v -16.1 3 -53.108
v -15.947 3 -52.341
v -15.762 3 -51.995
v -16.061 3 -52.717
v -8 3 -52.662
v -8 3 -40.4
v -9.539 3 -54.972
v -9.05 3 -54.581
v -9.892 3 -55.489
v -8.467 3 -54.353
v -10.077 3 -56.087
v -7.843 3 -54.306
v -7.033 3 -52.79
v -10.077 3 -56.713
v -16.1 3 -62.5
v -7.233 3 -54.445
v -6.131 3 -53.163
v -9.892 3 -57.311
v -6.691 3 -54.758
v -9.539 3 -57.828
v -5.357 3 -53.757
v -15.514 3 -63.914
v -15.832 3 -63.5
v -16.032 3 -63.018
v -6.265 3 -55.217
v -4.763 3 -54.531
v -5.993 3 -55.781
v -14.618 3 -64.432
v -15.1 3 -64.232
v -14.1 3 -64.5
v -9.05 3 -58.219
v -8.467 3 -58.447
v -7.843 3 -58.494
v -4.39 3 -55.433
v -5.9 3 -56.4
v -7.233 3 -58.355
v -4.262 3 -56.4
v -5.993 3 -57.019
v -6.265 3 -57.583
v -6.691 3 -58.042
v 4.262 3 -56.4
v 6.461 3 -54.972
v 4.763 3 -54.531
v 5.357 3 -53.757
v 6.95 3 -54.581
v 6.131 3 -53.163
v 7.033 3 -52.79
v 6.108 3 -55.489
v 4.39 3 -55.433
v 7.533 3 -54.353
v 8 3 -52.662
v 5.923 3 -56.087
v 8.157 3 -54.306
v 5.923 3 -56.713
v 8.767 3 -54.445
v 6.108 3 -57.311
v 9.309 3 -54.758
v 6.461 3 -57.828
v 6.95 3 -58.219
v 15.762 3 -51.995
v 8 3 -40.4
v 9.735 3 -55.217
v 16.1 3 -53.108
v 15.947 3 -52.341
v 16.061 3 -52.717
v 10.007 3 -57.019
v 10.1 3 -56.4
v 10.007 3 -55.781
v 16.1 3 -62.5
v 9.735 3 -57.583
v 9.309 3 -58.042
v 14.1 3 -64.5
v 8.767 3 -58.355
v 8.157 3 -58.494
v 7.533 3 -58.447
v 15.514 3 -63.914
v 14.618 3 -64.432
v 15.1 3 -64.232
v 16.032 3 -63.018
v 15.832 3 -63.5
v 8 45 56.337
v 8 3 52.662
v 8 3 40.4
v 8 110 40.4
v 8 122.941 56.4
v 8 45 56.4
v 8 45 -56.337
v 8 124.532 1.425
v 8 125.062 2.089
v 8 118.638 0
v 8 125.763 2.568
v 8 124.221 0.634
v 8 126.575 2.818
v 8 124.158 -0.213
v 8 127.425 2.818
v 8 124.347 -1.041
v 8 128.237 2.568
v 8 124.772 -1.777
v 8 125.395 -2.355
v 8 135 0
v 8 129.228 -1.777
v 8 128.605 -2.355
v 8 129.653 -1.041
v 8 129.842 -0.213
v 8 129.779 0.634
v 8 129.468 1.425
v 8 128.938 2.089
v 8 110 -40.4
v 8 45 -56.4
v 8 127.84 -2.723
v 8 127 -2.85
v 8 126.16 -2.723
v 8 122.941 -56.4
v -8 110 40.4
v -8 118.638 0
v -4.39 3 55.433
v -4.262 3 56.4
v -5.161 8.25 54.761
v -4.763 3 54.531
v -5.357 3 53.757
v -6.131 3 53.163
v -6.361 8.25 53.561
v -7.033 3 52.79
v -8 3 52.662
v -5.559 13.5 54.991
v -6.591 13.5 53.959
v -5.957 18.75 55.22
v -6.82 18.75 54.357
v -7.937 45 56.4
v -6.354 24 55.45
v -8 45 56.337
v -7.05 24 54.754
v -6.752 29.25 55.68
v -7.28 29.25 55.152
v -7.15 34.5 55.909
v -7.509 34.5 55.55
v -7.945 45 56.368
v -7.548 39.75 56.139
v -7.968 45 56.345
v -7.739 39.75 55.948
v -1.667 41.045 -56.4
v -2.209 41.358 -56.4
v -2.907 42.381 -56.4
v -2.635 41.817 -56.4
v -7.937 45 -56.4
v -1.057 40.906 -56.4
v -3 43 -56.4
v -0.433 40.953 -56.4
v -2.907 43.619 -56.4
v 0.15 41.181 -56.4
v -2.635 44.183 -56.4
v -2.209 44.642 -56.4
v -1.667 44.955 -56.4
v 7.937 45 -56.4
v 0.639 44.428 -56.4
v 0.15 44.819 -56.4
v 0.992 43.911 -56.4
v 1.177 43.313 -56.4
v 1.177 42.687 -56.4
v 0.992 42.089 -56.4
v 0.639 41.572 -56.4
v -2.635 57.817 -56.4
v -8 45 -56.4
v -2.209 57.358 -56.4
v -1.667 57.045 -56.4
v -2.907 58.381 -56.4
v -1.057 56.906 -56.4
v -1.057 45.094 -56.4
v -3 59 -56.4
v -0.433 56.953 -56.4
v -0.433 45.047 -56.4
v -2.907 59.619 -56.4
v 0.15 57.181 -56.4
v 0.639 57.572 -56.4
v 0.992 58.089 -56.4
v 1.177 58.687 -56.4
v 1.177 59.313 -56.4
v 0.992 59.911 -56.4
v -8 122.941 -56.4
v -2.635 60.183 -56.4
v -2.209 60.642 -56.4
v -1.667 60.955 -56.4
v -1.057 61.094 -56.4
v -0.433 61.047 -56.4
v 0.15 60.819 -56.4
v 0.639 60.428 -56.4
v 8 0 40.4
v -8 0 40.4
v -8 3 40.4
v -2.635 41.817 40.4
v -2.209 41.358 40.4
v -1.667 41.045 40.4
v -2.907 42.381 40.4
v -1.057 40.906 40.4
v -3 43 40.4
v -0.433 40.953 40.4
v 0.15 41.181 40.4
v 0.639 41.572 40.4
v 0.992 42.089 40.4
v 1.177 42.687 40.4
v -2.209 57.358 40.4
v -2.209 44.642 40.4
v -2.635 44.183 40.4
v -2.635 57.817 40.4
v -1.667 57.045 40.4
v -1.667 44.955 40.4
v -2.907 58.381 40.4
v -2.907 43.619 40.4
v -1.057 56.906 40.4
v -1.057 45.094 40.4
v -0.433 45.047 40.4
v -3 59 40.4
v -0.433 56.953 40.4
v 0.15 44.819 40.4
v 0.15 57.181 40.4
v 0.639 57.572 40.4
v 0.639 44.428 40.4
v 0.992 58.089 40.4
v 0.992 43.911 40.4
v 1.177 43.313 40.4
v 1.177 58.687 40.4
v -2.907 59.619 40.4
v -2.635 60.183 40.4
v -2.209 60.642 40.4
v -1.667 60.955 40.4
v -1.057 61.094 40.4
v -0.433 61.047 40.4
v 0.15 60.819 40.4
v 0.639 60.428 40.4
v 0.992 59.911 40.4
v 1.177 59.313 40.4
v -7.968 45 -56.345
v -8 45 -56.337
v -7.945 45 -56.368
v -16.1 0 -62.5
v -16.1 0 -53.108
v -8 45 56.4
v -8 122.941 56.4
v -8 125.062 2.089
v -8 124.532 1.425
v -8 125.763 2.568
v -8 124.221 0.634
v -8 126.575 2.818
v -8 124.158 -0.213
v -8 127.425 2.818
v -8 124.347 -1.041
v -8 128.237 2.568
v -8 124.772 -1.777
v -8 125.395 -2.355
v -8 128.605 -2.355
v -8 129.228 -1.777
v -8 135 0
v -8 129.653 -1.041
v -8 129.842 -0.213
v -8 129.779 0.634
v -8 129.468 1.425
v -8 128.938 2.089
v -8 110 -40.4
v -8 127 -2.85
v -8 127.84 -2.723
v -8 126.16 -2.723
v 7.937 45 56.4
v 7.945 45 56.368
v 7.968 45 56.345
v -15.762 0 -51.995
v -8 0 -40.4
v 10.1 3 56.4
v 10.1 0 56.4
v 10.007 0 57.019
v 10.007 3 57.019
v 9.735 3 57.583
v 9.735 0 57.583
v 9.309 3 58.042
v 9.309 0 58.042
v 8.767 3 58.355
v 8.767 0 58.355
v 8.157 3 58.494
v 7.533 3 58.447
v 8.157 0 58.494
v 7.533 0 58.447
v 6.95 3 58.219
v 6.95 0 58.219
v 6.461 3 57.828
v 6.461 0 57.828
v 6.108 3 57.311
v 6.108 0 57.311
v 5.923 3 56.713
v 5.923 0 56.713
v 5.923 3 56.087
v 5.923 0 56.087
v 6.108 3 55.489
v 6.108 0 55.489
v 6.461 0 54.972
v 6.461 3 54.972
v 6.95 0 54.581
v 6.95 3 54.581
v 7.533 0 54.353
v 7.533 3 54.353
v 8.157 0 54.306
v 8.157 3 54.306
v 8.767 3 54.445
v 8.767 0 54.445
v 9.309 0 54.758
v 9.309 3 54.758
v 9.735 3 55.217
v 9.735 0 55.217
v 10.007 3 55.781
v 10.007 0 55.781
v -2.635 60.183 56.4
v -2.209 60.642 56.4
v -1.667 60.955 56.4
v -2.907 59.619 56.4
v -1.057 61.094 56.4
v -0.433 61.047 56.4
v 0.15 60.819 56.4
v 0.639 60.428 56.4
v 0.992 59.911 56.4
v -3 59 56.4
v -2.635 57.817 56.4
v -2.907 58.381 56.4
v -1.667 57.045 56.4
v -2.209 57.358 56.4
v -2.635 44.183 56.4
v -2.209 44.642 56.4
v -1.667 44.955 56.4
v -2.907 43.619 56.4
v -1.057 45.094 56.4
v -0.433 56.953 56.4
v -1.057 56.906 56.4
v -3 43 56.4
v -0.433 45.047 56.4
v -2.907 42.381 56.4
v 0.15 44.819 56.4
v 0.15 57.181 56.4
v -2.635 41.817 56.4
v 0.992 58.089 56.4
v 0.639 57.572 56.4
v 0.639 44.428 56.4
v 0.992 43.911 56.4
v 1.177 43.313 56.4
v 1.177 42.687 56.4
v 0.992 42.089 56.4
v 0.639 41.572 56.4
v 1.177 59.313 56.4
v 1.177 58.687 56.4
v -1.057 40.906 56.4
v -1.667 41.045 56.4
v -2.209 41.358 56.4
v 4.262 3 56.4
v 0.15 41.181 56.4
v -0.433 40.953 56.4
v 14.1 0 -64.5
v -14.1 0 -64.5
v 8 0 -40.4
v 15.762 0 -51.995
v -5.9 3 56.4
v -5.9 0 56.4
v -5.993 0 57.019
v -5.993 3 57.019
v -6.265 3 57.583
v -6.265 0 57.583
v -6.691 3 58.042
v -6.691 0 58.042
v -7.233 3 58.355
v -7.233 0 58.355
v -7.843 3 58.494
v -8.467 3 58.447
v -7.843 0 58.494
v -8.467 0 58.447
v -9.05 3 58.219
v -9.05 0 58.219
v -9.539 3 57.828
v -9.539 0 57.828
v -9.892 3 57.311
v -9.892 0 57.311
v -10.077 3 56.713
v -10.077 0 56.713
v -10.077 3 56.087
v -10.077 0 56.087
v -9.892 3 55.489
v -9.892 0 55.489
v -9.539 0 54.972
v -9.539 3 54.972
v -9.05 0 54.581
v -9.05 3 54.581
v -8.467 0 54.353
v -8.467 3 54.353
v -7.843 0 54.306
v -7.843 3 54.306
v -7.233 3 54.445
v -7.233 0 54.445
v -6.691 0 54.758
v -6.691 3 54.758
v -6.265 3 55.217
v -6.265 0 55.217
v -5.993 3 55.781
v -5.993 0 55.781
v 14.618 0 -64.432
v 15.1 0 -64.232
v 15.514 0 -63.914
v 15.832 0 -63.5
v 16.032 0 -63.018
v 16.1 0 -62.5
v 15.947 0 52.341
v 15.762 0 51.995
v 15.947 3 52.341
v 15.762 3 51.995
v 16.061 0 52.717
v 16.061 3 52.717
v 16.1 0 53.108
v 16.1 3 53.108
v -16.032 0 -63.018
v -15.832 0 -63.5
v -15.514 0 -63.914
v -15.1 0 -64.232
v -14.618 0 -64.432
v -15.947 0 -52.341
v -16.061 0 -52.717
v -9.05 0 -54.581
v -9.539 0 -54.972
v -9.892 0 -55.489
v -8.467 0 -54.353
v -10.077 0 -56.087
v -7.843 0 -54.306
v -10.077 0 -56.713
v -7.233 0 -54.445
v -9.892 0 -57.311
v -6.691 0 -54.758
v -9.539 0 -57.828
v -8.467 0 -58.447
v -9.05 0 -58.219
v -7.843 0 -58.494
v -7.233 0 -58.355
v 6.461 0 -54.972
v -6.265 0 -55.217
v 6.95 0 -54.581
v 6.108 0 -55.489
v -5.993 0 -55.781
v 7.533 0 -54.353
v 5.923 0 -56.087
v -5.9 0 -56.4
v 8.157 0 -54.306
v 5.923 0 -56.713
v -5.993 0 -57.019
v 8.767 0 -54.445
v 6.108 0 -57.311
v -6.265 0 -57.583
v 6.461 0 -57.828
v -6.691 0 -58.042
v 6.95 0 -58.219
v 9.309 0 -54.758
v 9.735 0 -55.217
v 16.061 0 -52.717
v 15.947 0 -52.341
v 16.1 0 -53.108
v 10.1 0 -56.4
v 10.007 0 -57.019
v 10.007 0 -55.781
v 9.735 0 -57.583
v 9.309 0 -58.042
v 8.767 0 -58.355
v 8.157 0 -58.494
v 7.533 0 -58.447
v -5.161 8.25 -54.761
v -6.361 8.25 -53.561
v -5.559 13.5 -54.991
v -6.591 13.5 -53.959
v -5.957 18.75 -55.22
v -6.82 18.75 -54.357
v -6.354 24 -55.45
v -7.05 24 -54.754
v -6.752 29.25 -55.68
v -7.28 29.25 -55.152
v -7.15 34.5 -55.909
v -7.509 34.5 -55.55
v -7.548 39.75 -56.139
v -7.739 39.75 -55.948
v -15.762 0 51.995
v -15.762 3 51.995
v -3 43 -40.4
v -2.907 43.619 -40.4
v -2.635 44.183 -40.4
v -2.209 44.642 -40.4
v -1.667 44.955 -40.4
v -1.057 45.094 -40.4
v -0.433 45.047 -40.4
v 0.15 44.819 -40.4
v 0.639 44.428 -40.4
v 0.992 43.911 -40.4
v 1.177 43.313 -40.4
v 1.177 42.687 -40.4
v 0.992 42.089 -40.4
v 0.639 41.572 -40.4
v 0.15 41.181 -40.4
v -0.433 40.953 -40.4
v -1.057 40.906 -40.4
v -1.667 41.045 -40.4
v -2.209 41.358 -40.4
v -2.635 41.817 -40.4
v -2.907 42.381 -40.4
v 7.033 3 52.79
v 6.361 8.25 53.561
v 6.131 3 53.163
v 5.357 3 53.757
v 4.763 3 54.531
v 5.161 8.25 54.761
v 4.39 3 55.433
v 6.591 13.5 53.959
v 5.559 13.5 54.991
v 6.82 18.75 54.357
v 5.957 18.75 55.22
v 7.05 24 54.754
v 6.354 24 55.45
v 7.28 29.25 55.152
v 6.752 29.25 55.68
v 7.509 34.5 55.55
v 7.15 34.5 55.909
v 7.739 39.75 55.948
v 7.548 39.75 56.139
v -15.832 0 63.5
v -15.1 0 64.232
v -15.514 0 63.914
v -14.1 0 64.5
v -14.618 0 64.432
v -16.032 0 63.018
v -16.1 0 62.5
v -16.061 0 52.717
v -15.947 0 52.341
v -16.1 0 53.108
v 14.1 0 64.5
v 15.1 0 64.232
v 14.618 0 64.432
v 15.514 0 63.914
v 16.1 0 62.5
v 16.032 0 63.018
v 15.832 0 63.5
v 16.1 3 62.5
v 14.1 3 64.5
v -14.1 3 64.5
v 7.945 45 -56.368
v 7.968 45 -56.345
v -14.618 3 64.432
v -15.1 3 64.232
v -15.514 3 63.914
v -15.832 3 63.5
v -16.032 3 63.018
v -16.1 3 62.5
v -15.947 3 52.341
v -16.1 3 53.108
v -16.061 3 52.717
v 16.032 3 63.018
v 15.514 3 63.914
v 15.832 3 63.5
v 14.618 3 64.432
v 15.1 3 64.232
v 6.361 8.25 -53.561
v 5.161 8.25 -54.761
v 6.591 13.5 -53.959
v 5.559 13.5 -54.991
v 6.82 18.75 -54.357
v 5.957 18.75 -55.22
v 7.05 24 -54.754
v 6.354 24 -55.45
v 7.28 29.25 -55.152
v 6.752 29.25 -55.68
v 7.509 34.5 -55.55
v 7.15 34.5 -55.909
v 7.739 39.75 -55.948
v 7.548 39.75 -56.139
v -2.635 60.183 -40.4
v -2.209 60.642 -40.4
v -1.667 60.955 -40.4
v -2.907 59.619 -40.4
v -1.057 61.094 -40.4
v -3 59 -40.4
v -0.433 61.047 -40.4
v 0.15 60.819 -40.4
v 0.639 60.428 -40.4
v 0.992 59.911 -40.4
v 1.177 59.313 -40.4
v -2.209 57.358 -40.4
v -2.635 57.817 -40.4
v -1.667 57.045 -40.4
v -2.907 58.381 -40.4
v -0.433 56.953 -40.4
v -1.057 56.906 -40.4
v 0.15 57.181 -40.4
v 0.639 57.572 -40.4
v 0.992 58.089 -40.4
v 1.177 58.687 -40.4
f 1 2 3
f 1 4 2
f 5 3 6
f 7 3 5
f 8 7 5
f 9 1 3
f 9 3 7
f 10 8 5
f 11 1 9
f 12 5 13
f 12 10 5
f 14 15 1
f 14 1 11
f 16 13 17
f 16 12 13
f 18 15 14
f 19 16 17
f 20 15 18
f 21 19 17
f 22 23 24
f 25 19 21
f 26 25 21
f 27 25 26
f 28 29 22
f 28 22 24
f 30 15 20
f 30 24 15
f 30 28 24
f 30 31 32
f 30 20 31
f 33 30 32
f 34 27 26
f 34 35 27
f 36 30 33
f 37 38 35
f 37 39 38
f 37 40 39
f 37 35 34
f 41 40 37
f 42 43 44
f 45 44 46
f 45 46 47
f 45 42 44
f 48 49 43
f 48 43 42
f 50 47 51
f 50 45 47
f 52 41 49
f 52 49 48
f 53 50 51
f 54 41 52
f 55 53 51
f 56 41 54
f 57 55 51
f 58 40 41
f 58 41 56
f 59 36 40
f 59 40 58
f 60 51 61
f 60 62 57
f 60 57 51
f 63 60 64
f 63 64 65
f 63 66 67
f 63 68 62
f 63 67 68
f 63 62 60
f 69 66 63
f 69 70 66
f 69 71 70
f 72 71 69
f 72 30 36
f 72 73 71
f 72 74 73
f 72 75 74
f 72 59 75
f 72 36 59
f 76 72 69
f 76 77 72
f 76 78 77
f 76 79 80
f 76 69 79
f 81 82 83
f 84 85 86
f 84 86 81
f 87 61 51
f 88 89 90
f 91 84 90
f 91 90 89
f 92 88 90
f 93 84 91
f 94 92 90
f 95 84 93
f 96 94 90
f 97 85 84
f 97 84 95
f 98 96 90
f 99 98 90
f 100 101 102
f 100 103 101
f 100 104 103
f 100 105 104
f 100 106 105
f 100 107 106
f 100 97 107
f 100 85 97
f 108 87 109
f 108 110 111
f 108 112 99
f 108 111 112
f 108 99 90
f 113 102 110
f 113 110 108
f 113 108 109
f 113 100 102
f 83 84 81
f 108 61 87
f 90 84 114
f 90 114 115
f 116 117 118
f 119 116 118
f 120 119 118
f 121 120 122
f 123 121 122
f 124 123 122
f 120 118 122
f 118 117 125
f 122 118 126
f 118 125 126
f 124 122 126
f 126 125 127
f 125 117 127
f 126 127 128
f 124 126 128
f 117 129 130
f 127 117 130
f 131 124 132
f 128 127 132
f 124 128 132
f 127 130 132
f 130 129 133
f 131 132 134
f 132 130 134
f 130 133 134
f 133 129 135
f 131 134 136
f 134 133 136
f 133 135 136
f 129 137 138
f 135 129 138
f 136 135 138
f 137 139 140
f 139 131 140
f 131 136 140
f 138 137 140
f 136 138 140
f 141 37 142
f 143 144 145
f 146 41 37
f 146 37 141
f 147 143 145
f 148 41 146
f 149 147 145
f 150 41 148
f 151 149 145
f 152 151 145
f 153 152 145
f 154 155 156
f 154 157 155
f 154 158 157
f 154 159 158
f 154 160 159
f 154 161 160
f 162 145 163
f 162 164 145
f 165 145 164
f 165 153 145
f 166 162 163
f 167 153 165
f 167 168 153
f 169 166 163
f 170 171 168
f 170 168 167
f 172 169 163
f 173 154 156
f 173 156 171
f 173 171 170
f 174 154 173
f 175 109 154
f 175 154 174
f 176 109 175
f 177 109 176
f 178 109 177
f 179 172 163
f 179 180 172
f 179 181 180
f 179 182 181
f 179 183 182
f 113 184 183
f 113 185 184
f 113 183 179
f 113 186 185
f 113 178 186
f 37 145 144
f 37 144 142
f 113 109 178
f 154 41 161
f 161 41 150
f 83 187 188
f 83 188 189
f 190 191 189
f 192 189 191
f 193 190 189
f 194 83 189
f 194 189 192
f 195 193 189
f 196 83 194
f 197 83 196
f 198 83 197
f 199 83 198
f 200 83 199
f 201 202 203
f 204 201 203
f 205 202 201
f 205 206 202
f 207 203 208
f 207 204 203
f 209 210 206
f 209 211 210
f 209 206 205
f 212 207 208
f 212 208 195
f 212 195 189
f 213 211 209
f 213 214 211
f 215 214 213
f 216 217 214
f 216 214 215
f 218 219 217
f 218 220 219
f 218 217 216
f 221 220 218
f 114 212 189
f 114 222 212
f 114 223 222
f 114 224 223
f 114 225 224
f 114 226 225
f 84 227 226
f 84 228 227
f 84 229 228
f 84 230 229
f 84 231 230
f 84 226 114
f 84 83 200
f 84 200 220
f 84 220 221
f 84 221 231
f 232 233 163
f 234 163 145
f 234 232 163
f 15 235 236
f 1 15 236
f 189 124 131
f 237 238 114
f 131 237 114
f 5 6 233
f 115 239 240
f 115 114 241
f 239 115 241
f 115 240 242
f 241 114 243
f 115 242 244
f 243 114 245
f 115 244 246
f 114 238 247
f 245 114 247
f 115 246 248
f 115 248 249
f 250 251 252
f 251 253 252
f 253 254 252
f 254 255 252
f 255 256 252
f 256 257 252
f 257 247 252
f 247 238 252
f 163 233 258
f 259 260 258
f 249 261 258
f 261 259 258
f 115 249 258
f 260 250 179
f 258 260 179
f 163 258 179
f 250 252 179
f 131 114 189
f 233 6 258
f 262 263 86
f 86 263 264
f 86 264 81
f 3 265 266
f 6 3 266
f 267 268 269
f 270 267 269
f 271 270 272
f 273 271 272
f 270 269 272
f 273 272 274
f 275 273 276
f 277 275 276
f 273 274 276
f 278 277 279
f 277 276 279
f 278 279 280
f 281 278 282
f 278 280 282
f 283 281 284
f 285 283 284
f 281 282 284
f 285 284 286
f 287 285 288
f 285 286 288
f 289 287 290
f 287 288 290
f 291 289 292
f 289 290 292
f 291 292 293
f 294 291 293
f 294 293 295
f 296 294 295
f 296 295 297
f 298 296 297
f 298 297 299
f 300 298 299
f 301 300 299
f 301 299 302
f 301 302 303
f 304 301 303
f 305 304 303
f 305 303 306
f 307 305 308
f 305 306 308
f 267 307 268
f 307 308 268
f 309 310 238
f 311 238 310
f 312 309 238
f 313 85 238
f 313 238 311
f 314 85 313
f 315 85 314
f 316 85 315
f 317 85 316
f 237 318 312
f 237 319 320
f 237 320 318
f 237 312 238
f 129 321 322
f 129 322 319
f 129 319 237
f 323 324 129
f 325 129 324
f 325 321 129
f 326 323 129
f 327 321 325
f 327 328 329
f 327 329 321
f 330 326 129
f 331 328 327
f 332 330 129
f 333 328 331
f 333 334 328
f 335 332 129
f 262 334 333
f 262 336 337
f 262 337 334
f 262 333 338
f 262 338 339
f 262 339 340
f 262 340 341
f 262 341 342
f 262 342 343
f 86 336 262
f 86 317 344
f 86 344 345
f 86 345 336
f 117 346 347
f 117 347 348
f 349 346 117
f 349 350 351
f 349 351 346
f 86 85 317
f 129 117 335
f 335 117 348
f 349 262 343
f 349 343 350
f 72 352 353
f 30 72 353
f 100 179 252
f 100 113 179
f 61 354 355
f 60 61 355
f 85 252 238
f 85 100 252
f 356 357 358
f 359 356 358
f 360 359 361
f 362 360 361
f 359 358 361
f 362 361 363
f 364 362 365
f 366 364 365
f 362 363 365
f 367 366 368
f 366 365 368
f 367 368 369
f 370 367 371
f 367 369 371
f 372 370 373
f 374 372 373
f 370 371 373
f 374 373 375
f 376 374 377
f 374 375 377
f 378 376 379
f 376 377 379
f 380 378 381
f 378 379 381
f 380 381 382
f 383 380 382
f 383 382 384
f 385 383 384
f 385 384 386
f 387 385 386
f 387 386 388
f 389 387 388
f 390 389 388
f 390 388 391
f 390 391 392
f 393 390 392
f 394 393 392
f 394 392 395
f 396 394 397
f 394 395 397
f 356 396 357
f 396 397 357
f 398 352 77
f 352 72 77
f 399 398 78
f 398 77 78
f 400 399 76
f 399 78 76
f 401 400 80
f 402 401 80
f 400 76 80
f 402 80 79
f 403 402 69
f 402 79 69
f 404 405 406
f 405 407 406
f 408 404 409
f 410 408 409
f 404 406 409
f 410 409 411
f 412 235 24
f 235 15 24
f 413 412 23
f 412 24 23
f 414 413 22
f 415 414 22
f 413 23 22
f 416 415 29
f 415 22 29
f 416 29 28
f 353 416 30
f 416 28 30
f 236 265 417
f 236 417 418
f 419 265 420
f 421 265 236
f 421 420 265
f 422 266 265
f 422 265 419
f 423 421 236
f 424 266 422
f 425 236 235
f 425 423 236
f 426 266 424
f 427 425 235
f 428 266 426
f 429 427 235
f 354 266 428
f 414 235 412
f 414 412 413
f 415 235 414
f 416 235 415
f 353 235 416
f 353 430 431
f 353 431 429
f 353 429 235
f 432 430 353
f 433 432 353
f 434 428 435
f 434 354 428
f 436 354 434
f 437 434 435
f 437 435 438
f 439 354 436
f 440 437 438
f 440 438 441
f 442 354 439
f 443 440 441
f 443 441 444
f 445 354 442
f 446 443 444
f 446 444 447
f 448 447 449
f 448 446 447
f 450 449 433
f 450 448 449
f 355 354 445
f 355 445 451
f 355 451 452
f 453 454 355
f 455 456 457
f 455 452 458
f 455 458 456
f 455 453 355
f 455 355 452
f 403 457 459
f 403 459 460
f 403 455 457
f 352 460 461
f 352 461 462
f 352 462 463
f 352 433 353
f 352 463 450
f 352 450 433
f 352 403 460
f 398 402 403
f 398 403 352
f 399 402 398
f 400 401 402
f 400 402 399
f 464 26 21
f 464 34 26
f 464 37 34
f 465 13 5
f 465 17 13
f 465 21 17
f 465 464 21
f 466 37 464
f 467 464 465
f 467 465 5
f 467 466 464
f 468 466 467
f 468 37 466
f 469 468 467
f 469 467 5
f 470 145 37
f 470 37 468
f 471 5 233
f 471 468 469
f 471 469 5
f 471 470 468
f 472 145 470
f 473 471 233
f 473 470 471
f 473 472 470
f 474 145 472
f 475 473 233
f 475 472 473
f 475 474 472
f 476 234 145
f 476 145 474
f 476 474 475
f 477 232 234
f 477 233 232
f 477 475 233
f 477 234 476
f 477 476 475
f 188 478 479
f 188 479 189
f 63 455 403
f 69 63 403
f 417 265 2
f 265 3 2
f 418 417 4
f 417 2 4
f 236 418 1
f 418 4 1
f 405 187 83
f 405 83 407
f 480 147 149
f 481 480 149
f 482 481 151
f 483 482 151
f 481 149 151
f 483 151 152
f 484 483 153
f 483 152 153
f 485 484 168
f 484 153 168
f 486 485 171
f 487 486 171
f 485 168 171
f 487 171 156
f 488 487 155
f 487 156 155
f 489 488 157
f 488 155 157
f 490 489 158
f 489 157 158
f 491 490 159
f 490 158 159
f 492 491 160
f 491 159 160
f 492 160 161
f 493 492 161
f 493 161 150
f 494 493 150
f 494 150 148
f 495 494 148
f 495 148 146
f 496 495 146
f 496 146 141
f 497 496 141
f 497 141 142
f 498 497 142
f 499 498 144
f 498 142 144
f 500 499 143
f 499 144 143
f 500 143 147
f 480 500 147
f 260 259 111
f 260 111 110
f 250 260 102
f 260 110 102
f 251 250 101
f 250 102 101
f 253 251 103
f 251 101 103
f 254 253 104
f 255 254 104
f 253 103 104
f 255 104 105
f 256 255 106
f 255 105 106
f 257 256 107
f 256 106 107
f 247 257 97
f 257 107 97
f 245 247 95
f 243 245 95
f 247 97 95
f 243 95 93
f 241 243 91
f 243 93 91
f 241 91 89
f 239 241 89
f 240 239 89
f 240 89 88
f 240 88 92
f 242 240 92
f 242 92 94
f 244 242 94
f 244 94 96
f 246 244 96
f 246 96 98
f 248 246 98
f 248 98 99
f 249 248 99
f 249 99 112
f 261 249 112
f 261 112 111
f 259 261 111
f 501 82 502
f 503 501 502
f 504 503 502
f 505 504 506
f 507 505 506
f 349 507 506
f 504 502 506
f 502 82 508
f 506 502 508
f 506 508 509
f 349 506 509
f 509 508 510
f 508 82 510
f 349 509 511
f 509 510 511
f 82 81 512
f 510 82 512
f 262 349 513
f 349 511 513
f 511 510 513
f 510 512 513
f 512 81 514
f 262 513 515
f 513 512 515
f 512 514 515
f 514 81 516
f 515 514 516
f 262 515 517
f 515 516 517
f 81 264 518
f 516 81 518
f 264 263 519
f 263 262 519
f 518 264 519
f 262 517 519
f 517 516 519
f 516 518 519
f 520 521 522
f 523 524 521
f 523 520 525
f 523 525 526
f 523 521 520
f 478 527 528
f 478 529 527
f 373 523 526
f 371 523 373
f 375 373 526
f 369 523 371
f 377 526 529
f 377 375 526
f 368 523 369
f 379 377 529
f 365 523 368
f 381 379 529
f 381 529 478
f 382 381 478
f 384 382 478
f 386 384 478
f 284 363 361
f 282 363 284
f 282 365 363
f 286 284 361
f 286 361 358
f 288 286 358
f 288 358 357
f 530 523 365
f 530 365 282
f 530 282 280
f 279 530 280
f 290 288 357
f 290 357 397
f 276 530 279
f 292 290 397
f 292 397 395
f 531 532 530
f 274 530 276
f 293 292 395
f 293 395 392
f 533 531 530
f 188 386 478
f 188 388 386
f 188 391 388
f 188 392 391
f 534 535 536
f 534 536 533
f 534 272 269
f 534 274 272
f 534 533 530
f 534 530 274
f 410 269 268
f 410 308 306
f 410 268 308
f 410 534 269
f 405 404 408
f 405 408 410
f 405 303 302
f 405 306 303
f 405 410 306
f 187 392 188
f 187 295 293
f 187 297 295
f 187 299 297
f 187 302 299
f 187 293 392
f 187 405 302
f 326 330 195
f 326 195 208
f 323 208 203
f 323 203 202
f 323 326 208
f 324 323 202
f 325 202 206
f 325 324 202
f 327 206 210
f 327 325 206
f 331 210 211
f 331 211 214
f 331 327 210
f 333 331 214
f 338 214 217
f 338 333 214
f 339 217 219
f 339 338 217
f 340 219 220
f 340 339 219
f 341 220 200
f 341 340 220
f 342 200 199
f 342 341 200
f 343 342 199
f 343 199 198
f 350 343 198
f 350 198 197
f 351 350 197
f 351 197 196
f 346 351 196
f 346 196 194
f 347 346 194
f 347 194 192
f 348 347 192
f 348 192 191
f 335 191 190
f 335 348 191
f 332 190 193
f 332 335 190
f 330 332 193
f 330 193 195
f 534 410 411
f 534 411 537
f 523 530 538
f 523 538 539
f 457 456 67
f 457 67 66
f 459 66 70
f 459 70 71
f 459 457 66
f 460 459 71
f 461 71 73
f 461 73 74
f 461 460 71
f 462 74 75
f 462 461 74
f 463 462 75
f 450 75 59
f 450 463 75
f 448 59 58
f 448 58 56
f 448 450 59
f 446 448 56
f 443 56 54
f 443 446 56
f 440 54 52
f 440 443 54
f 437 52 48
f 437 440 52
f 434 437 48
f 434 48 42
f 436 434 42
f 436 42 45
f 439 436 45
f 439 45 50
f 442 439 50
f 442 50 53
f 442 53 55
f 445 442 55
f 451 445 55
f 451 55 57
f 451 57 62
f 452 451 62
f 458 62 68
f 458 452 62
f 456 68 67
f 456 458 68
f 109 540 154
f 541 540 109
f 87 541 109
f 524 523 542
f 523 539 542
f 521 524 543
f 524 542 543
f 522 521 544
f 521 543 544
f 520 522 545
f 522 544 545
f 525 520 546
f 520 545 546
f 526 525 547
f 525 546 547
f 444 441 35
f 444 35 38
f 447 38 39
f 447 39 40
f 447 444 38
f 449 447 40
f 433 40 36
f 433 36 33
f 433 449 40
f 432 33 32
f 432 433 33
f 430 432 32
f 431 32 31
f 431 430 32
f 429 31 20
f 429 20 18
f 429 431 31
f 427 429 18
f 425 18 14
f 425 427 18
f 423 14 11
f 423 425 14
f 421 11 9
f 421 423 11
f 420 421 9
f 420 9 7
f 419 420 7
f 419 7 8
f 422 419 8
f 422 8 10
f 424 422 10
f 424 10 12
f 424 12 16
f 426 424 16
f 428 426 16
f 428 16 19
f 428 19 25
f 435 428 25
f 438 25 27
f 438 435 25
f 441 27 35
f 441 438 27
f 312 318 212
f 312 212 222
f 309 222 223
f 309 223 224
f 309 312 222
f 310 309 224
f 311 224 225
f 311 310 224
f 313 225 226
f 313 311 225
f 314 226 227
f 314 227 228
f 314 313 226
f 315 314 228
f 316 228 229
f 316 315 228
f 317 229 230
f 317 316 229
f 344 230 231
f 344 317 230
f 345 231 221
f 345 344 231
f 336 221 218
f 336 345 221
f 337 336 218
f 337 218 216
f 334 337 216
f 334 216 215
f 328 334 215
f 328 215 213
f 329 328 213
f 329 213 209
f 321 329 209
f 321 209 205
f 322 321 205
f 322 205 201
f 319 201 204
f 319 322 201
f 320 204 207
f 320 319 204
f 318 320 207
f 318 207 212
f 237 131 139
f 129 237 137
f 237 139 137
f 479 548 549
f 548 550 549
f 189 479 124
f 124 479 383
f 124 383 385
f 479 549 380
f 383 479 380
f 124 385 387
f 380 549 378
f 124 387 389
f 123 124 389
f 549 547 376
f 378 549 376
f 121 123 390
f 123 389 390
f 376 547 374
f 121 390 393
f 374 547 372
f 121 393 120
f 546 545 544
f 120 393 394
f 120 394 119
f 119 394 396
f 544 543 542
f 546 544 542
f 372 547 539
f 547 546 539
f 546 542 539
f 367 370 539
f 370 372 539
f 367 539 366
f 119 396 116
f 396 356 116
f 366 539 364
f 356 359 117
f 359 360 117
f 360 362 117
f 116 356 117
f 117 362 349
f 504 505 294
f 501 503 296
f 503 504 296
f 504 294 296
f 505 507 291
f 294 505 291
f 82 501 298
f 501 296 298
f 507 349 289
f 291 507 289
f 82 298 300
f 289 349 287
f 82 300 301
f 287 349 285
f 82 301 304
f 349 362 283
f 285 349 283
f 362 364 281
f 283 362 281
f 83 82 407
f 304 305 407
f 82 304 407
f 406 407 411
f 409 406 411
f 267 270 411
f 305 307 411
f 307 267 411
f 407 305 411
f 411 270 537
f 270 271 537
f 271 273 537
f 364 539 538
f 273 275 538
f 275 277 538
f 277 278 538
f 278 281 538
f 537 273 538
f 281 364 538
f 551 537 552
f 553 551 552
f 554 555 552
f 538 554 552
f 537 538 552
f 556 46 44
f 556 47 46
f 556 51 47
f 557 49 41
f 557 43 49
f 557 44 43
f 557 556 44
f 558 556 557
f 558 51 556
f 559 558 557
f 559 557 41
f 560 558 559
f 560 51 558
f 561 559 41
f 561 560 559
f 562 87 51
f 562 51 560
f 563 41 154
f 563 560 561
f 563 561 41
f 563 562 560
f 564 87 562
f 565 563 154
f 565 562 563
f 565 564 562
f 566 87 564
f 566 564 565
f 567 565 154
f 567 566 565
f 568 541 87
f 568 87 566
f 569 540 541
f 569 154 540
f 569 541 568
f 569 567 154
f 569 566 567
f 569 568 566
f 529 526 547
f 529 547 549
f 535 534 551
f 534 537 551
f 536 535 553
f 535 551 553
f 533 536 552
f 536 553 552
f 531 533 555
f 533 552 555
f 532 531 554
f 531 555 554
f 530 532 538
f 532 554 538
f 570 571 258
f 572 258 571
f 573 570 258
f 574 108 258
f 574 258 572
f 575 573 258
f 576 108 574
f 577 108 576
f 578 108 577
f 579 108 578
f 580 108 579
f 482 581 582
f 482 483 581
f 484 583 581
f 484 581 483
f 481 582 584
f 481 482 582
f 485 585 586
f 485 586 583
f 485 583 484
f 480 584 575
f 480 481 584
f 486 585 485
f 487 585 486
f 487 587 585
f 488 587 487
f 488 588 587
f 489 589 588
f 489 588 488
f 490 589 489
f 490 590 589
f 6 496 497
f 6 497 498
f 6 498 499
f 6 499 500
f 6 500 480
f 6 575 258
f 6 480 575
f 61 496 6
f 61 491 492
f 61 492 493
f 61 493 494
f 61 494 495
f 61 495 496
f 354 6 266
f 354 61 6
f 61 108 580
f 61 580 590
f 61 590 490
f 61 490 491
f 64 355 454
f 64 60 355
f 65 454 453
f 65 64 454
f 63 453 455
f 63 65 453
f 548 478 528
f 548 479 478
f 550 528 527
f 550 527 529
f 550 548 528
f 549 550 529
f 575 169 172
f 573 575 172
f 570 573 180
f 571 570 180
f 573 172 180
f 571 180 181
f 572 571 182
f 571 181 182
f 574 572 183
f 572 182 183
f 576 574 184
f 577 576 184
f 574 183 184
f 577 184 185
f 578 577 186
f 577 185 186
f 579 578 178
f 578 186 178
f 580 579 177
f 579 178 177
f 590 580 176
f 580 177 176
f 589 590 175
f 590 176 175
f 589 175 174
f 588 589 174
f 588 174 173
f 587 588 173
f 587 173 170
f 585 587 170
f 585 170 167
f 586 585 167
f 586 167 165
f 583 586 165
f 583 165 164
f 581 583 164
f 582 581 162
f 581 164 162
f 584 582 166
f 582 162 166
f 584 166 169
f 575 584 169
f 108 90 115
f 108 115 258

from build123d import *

# Parameters (mm, degrees)
BOSS_EXTRUDE1_DEPTH          = 8
SKETCH2_R                    = 4
CUT_EXTRUDE1_DEPTH           = 45
CUT_EXTRUDE1_TAPER           = 5
CUT_EXTRUDE1_OTHER_WAY_DEPTH = 1
SKETCH3_R                    = 2.1
BOSS_EXTRUDE2_DEPTH          = 3
FILLET1_R                    = 2
SKETCH4_R                    = 2.1
CUT_EXTRUDE2_DEPTH           = 16
FILLET1_OF_MIRROR1_R         = 2
SKETCH5_R                    = 2.85
CUT_EXTRUDE3_DEPTH           = 25.1


with BuildPart() as part:
    # Sketch1 → Boss-Extrude1 (new body, symmetric)
    with BuildSketch(Plane(origin=(0, 0, 0), x_dir=(0, 0, -1), z_dir=(1, 0, 0))):
        Polygon((-56.4, 122.940542206), (-56.4, 0), (-40.4, 0), (-40.4, 110), (0, 118.638335016), (40.4, 110), (40.4, 0), (56.4, 0), (56.4, 122.940542206), (0, 135), align=None)
    extrude(amount=BOSS_EXTRUDE1_DEPTH, both=True)

    # Sketch2 → Cut-Extrude1 (cut)
    with BuildSketch(Plane.XZ):
        with Locations((-8, -56.4)):
            Circle(SKETCH2_R)
        with Locations((8, -56.4)):
            Circle(SKETCH2_R)
    cut_extrude1 = extrude(amount=-CUT_EXTRUDE1_DEPTH, taper=CUT_EXTRUDE1_TAPER, mode=Mode.SUBTRACT)

    # Sketch2 → Cut-Extrude1 other way (cut)
    with BuildSketch(Plane.XZ):
        with Locations((-8, -56.4)):
            Circle(SKETCH2_R)
        with Locations((8, -56.4)):
            Circle(SKETCH2_R)
    extrude(amount=CUT_EXTRUDE1_OTHER_WAY_DEPTH, mode=Mode.SUBTRACT)

    # Sketch3 → Boss-Extrude2 (add)
    with BuildSketch(Plane(origin=(0, 0, 0), x_dir=(1, 0, 0), z_dir=(0, 1, 0))):
        Polygon((-8, 40.4), (8, 40.4), (16.1, 52.5), (16.1, 64.5), (-16.1, 64.5), (-16.1, 52.5), align=None)
        with Locations((-8, 56.4)):
            Circle(SKETCH3_R, mode=Mode.SUBTRACT)
        with Locations((8, 56.4)):
            Circle(SKETCH3_R, mode=Mode.SUBTRACT)
    boss_extrude2 = extrude(amount=BOSS_EXTRUDE2_DEPTH)

    # Fillet1
    fillet1_edges = [part.edges().sort_by_distance(p)[0] for p in [
        (16.1, 1.5, -52.5),
        (16.1, 1.5, -64.5),
        (-16.1, 1.5, -64.5),
        (-16.1, 1.5, -52.5),
    ]]
    fillet(fillet1_edges, radius=FILLET1_R)

    # Sketch4 → Cut-Extrude2 (cut)
    with BuildSketch(Plane(origin=(0, 0, -56.4), x_dir=(-1, 0, 0), z_dir=(0, 0, -1))):
        with Locations((0.9, 59)):
            Circle(SKETCH4_R)
        with Locations((0.9, 43)):
            Circle(SKETCH4_R)
    cut_extrude2 = extrude(amount=-CUT_EXTRUDE2_DEPTH, mode=Mode.SUBTRACT)

    # Mirror1: Cut-Extrude1, Boss-Extrude2, Cut-Extrude2 across plane
    add(cut_extrude1.mirror(Plane.XY), mode=Mode.SUBTRACT)
    add(boss_extrude2.mirror(Plane.XY))
    add(cut_extrude2.mirror(Plane.XY), mode=Mode.SUBTRACT)

    # Fillet1 of Mirror1
    fillet1_of_mirror1_edges = [part.edges().sort_by_distance(p)[0] for p in [
        (16.1, 1.5, 52.5),
        (16.1, 1.5, 64.5),
        (-16.1, 1.5, 64.5),
        (-16.1, 1.5, 52.5),
    ]]
    fillet(fillet1_of_mirror1_edges, radius=FILLET1_OF_MIRROR1_R)

    # Sketch5 → Cut-Extrude3 (cut, through all)
    with BuildSketch(Plane(origin=(8, 0, 0), x_dir=(0, 0, -1), z_dir=(1, 0, 0))):
        with Locations((0, 127)):
            Circle(SKETCH5_R)
    extrude(amount=-CUT_EXTRUDE3_DEPTH, mode=Mode.SUBTRACT)


solid = part.part
